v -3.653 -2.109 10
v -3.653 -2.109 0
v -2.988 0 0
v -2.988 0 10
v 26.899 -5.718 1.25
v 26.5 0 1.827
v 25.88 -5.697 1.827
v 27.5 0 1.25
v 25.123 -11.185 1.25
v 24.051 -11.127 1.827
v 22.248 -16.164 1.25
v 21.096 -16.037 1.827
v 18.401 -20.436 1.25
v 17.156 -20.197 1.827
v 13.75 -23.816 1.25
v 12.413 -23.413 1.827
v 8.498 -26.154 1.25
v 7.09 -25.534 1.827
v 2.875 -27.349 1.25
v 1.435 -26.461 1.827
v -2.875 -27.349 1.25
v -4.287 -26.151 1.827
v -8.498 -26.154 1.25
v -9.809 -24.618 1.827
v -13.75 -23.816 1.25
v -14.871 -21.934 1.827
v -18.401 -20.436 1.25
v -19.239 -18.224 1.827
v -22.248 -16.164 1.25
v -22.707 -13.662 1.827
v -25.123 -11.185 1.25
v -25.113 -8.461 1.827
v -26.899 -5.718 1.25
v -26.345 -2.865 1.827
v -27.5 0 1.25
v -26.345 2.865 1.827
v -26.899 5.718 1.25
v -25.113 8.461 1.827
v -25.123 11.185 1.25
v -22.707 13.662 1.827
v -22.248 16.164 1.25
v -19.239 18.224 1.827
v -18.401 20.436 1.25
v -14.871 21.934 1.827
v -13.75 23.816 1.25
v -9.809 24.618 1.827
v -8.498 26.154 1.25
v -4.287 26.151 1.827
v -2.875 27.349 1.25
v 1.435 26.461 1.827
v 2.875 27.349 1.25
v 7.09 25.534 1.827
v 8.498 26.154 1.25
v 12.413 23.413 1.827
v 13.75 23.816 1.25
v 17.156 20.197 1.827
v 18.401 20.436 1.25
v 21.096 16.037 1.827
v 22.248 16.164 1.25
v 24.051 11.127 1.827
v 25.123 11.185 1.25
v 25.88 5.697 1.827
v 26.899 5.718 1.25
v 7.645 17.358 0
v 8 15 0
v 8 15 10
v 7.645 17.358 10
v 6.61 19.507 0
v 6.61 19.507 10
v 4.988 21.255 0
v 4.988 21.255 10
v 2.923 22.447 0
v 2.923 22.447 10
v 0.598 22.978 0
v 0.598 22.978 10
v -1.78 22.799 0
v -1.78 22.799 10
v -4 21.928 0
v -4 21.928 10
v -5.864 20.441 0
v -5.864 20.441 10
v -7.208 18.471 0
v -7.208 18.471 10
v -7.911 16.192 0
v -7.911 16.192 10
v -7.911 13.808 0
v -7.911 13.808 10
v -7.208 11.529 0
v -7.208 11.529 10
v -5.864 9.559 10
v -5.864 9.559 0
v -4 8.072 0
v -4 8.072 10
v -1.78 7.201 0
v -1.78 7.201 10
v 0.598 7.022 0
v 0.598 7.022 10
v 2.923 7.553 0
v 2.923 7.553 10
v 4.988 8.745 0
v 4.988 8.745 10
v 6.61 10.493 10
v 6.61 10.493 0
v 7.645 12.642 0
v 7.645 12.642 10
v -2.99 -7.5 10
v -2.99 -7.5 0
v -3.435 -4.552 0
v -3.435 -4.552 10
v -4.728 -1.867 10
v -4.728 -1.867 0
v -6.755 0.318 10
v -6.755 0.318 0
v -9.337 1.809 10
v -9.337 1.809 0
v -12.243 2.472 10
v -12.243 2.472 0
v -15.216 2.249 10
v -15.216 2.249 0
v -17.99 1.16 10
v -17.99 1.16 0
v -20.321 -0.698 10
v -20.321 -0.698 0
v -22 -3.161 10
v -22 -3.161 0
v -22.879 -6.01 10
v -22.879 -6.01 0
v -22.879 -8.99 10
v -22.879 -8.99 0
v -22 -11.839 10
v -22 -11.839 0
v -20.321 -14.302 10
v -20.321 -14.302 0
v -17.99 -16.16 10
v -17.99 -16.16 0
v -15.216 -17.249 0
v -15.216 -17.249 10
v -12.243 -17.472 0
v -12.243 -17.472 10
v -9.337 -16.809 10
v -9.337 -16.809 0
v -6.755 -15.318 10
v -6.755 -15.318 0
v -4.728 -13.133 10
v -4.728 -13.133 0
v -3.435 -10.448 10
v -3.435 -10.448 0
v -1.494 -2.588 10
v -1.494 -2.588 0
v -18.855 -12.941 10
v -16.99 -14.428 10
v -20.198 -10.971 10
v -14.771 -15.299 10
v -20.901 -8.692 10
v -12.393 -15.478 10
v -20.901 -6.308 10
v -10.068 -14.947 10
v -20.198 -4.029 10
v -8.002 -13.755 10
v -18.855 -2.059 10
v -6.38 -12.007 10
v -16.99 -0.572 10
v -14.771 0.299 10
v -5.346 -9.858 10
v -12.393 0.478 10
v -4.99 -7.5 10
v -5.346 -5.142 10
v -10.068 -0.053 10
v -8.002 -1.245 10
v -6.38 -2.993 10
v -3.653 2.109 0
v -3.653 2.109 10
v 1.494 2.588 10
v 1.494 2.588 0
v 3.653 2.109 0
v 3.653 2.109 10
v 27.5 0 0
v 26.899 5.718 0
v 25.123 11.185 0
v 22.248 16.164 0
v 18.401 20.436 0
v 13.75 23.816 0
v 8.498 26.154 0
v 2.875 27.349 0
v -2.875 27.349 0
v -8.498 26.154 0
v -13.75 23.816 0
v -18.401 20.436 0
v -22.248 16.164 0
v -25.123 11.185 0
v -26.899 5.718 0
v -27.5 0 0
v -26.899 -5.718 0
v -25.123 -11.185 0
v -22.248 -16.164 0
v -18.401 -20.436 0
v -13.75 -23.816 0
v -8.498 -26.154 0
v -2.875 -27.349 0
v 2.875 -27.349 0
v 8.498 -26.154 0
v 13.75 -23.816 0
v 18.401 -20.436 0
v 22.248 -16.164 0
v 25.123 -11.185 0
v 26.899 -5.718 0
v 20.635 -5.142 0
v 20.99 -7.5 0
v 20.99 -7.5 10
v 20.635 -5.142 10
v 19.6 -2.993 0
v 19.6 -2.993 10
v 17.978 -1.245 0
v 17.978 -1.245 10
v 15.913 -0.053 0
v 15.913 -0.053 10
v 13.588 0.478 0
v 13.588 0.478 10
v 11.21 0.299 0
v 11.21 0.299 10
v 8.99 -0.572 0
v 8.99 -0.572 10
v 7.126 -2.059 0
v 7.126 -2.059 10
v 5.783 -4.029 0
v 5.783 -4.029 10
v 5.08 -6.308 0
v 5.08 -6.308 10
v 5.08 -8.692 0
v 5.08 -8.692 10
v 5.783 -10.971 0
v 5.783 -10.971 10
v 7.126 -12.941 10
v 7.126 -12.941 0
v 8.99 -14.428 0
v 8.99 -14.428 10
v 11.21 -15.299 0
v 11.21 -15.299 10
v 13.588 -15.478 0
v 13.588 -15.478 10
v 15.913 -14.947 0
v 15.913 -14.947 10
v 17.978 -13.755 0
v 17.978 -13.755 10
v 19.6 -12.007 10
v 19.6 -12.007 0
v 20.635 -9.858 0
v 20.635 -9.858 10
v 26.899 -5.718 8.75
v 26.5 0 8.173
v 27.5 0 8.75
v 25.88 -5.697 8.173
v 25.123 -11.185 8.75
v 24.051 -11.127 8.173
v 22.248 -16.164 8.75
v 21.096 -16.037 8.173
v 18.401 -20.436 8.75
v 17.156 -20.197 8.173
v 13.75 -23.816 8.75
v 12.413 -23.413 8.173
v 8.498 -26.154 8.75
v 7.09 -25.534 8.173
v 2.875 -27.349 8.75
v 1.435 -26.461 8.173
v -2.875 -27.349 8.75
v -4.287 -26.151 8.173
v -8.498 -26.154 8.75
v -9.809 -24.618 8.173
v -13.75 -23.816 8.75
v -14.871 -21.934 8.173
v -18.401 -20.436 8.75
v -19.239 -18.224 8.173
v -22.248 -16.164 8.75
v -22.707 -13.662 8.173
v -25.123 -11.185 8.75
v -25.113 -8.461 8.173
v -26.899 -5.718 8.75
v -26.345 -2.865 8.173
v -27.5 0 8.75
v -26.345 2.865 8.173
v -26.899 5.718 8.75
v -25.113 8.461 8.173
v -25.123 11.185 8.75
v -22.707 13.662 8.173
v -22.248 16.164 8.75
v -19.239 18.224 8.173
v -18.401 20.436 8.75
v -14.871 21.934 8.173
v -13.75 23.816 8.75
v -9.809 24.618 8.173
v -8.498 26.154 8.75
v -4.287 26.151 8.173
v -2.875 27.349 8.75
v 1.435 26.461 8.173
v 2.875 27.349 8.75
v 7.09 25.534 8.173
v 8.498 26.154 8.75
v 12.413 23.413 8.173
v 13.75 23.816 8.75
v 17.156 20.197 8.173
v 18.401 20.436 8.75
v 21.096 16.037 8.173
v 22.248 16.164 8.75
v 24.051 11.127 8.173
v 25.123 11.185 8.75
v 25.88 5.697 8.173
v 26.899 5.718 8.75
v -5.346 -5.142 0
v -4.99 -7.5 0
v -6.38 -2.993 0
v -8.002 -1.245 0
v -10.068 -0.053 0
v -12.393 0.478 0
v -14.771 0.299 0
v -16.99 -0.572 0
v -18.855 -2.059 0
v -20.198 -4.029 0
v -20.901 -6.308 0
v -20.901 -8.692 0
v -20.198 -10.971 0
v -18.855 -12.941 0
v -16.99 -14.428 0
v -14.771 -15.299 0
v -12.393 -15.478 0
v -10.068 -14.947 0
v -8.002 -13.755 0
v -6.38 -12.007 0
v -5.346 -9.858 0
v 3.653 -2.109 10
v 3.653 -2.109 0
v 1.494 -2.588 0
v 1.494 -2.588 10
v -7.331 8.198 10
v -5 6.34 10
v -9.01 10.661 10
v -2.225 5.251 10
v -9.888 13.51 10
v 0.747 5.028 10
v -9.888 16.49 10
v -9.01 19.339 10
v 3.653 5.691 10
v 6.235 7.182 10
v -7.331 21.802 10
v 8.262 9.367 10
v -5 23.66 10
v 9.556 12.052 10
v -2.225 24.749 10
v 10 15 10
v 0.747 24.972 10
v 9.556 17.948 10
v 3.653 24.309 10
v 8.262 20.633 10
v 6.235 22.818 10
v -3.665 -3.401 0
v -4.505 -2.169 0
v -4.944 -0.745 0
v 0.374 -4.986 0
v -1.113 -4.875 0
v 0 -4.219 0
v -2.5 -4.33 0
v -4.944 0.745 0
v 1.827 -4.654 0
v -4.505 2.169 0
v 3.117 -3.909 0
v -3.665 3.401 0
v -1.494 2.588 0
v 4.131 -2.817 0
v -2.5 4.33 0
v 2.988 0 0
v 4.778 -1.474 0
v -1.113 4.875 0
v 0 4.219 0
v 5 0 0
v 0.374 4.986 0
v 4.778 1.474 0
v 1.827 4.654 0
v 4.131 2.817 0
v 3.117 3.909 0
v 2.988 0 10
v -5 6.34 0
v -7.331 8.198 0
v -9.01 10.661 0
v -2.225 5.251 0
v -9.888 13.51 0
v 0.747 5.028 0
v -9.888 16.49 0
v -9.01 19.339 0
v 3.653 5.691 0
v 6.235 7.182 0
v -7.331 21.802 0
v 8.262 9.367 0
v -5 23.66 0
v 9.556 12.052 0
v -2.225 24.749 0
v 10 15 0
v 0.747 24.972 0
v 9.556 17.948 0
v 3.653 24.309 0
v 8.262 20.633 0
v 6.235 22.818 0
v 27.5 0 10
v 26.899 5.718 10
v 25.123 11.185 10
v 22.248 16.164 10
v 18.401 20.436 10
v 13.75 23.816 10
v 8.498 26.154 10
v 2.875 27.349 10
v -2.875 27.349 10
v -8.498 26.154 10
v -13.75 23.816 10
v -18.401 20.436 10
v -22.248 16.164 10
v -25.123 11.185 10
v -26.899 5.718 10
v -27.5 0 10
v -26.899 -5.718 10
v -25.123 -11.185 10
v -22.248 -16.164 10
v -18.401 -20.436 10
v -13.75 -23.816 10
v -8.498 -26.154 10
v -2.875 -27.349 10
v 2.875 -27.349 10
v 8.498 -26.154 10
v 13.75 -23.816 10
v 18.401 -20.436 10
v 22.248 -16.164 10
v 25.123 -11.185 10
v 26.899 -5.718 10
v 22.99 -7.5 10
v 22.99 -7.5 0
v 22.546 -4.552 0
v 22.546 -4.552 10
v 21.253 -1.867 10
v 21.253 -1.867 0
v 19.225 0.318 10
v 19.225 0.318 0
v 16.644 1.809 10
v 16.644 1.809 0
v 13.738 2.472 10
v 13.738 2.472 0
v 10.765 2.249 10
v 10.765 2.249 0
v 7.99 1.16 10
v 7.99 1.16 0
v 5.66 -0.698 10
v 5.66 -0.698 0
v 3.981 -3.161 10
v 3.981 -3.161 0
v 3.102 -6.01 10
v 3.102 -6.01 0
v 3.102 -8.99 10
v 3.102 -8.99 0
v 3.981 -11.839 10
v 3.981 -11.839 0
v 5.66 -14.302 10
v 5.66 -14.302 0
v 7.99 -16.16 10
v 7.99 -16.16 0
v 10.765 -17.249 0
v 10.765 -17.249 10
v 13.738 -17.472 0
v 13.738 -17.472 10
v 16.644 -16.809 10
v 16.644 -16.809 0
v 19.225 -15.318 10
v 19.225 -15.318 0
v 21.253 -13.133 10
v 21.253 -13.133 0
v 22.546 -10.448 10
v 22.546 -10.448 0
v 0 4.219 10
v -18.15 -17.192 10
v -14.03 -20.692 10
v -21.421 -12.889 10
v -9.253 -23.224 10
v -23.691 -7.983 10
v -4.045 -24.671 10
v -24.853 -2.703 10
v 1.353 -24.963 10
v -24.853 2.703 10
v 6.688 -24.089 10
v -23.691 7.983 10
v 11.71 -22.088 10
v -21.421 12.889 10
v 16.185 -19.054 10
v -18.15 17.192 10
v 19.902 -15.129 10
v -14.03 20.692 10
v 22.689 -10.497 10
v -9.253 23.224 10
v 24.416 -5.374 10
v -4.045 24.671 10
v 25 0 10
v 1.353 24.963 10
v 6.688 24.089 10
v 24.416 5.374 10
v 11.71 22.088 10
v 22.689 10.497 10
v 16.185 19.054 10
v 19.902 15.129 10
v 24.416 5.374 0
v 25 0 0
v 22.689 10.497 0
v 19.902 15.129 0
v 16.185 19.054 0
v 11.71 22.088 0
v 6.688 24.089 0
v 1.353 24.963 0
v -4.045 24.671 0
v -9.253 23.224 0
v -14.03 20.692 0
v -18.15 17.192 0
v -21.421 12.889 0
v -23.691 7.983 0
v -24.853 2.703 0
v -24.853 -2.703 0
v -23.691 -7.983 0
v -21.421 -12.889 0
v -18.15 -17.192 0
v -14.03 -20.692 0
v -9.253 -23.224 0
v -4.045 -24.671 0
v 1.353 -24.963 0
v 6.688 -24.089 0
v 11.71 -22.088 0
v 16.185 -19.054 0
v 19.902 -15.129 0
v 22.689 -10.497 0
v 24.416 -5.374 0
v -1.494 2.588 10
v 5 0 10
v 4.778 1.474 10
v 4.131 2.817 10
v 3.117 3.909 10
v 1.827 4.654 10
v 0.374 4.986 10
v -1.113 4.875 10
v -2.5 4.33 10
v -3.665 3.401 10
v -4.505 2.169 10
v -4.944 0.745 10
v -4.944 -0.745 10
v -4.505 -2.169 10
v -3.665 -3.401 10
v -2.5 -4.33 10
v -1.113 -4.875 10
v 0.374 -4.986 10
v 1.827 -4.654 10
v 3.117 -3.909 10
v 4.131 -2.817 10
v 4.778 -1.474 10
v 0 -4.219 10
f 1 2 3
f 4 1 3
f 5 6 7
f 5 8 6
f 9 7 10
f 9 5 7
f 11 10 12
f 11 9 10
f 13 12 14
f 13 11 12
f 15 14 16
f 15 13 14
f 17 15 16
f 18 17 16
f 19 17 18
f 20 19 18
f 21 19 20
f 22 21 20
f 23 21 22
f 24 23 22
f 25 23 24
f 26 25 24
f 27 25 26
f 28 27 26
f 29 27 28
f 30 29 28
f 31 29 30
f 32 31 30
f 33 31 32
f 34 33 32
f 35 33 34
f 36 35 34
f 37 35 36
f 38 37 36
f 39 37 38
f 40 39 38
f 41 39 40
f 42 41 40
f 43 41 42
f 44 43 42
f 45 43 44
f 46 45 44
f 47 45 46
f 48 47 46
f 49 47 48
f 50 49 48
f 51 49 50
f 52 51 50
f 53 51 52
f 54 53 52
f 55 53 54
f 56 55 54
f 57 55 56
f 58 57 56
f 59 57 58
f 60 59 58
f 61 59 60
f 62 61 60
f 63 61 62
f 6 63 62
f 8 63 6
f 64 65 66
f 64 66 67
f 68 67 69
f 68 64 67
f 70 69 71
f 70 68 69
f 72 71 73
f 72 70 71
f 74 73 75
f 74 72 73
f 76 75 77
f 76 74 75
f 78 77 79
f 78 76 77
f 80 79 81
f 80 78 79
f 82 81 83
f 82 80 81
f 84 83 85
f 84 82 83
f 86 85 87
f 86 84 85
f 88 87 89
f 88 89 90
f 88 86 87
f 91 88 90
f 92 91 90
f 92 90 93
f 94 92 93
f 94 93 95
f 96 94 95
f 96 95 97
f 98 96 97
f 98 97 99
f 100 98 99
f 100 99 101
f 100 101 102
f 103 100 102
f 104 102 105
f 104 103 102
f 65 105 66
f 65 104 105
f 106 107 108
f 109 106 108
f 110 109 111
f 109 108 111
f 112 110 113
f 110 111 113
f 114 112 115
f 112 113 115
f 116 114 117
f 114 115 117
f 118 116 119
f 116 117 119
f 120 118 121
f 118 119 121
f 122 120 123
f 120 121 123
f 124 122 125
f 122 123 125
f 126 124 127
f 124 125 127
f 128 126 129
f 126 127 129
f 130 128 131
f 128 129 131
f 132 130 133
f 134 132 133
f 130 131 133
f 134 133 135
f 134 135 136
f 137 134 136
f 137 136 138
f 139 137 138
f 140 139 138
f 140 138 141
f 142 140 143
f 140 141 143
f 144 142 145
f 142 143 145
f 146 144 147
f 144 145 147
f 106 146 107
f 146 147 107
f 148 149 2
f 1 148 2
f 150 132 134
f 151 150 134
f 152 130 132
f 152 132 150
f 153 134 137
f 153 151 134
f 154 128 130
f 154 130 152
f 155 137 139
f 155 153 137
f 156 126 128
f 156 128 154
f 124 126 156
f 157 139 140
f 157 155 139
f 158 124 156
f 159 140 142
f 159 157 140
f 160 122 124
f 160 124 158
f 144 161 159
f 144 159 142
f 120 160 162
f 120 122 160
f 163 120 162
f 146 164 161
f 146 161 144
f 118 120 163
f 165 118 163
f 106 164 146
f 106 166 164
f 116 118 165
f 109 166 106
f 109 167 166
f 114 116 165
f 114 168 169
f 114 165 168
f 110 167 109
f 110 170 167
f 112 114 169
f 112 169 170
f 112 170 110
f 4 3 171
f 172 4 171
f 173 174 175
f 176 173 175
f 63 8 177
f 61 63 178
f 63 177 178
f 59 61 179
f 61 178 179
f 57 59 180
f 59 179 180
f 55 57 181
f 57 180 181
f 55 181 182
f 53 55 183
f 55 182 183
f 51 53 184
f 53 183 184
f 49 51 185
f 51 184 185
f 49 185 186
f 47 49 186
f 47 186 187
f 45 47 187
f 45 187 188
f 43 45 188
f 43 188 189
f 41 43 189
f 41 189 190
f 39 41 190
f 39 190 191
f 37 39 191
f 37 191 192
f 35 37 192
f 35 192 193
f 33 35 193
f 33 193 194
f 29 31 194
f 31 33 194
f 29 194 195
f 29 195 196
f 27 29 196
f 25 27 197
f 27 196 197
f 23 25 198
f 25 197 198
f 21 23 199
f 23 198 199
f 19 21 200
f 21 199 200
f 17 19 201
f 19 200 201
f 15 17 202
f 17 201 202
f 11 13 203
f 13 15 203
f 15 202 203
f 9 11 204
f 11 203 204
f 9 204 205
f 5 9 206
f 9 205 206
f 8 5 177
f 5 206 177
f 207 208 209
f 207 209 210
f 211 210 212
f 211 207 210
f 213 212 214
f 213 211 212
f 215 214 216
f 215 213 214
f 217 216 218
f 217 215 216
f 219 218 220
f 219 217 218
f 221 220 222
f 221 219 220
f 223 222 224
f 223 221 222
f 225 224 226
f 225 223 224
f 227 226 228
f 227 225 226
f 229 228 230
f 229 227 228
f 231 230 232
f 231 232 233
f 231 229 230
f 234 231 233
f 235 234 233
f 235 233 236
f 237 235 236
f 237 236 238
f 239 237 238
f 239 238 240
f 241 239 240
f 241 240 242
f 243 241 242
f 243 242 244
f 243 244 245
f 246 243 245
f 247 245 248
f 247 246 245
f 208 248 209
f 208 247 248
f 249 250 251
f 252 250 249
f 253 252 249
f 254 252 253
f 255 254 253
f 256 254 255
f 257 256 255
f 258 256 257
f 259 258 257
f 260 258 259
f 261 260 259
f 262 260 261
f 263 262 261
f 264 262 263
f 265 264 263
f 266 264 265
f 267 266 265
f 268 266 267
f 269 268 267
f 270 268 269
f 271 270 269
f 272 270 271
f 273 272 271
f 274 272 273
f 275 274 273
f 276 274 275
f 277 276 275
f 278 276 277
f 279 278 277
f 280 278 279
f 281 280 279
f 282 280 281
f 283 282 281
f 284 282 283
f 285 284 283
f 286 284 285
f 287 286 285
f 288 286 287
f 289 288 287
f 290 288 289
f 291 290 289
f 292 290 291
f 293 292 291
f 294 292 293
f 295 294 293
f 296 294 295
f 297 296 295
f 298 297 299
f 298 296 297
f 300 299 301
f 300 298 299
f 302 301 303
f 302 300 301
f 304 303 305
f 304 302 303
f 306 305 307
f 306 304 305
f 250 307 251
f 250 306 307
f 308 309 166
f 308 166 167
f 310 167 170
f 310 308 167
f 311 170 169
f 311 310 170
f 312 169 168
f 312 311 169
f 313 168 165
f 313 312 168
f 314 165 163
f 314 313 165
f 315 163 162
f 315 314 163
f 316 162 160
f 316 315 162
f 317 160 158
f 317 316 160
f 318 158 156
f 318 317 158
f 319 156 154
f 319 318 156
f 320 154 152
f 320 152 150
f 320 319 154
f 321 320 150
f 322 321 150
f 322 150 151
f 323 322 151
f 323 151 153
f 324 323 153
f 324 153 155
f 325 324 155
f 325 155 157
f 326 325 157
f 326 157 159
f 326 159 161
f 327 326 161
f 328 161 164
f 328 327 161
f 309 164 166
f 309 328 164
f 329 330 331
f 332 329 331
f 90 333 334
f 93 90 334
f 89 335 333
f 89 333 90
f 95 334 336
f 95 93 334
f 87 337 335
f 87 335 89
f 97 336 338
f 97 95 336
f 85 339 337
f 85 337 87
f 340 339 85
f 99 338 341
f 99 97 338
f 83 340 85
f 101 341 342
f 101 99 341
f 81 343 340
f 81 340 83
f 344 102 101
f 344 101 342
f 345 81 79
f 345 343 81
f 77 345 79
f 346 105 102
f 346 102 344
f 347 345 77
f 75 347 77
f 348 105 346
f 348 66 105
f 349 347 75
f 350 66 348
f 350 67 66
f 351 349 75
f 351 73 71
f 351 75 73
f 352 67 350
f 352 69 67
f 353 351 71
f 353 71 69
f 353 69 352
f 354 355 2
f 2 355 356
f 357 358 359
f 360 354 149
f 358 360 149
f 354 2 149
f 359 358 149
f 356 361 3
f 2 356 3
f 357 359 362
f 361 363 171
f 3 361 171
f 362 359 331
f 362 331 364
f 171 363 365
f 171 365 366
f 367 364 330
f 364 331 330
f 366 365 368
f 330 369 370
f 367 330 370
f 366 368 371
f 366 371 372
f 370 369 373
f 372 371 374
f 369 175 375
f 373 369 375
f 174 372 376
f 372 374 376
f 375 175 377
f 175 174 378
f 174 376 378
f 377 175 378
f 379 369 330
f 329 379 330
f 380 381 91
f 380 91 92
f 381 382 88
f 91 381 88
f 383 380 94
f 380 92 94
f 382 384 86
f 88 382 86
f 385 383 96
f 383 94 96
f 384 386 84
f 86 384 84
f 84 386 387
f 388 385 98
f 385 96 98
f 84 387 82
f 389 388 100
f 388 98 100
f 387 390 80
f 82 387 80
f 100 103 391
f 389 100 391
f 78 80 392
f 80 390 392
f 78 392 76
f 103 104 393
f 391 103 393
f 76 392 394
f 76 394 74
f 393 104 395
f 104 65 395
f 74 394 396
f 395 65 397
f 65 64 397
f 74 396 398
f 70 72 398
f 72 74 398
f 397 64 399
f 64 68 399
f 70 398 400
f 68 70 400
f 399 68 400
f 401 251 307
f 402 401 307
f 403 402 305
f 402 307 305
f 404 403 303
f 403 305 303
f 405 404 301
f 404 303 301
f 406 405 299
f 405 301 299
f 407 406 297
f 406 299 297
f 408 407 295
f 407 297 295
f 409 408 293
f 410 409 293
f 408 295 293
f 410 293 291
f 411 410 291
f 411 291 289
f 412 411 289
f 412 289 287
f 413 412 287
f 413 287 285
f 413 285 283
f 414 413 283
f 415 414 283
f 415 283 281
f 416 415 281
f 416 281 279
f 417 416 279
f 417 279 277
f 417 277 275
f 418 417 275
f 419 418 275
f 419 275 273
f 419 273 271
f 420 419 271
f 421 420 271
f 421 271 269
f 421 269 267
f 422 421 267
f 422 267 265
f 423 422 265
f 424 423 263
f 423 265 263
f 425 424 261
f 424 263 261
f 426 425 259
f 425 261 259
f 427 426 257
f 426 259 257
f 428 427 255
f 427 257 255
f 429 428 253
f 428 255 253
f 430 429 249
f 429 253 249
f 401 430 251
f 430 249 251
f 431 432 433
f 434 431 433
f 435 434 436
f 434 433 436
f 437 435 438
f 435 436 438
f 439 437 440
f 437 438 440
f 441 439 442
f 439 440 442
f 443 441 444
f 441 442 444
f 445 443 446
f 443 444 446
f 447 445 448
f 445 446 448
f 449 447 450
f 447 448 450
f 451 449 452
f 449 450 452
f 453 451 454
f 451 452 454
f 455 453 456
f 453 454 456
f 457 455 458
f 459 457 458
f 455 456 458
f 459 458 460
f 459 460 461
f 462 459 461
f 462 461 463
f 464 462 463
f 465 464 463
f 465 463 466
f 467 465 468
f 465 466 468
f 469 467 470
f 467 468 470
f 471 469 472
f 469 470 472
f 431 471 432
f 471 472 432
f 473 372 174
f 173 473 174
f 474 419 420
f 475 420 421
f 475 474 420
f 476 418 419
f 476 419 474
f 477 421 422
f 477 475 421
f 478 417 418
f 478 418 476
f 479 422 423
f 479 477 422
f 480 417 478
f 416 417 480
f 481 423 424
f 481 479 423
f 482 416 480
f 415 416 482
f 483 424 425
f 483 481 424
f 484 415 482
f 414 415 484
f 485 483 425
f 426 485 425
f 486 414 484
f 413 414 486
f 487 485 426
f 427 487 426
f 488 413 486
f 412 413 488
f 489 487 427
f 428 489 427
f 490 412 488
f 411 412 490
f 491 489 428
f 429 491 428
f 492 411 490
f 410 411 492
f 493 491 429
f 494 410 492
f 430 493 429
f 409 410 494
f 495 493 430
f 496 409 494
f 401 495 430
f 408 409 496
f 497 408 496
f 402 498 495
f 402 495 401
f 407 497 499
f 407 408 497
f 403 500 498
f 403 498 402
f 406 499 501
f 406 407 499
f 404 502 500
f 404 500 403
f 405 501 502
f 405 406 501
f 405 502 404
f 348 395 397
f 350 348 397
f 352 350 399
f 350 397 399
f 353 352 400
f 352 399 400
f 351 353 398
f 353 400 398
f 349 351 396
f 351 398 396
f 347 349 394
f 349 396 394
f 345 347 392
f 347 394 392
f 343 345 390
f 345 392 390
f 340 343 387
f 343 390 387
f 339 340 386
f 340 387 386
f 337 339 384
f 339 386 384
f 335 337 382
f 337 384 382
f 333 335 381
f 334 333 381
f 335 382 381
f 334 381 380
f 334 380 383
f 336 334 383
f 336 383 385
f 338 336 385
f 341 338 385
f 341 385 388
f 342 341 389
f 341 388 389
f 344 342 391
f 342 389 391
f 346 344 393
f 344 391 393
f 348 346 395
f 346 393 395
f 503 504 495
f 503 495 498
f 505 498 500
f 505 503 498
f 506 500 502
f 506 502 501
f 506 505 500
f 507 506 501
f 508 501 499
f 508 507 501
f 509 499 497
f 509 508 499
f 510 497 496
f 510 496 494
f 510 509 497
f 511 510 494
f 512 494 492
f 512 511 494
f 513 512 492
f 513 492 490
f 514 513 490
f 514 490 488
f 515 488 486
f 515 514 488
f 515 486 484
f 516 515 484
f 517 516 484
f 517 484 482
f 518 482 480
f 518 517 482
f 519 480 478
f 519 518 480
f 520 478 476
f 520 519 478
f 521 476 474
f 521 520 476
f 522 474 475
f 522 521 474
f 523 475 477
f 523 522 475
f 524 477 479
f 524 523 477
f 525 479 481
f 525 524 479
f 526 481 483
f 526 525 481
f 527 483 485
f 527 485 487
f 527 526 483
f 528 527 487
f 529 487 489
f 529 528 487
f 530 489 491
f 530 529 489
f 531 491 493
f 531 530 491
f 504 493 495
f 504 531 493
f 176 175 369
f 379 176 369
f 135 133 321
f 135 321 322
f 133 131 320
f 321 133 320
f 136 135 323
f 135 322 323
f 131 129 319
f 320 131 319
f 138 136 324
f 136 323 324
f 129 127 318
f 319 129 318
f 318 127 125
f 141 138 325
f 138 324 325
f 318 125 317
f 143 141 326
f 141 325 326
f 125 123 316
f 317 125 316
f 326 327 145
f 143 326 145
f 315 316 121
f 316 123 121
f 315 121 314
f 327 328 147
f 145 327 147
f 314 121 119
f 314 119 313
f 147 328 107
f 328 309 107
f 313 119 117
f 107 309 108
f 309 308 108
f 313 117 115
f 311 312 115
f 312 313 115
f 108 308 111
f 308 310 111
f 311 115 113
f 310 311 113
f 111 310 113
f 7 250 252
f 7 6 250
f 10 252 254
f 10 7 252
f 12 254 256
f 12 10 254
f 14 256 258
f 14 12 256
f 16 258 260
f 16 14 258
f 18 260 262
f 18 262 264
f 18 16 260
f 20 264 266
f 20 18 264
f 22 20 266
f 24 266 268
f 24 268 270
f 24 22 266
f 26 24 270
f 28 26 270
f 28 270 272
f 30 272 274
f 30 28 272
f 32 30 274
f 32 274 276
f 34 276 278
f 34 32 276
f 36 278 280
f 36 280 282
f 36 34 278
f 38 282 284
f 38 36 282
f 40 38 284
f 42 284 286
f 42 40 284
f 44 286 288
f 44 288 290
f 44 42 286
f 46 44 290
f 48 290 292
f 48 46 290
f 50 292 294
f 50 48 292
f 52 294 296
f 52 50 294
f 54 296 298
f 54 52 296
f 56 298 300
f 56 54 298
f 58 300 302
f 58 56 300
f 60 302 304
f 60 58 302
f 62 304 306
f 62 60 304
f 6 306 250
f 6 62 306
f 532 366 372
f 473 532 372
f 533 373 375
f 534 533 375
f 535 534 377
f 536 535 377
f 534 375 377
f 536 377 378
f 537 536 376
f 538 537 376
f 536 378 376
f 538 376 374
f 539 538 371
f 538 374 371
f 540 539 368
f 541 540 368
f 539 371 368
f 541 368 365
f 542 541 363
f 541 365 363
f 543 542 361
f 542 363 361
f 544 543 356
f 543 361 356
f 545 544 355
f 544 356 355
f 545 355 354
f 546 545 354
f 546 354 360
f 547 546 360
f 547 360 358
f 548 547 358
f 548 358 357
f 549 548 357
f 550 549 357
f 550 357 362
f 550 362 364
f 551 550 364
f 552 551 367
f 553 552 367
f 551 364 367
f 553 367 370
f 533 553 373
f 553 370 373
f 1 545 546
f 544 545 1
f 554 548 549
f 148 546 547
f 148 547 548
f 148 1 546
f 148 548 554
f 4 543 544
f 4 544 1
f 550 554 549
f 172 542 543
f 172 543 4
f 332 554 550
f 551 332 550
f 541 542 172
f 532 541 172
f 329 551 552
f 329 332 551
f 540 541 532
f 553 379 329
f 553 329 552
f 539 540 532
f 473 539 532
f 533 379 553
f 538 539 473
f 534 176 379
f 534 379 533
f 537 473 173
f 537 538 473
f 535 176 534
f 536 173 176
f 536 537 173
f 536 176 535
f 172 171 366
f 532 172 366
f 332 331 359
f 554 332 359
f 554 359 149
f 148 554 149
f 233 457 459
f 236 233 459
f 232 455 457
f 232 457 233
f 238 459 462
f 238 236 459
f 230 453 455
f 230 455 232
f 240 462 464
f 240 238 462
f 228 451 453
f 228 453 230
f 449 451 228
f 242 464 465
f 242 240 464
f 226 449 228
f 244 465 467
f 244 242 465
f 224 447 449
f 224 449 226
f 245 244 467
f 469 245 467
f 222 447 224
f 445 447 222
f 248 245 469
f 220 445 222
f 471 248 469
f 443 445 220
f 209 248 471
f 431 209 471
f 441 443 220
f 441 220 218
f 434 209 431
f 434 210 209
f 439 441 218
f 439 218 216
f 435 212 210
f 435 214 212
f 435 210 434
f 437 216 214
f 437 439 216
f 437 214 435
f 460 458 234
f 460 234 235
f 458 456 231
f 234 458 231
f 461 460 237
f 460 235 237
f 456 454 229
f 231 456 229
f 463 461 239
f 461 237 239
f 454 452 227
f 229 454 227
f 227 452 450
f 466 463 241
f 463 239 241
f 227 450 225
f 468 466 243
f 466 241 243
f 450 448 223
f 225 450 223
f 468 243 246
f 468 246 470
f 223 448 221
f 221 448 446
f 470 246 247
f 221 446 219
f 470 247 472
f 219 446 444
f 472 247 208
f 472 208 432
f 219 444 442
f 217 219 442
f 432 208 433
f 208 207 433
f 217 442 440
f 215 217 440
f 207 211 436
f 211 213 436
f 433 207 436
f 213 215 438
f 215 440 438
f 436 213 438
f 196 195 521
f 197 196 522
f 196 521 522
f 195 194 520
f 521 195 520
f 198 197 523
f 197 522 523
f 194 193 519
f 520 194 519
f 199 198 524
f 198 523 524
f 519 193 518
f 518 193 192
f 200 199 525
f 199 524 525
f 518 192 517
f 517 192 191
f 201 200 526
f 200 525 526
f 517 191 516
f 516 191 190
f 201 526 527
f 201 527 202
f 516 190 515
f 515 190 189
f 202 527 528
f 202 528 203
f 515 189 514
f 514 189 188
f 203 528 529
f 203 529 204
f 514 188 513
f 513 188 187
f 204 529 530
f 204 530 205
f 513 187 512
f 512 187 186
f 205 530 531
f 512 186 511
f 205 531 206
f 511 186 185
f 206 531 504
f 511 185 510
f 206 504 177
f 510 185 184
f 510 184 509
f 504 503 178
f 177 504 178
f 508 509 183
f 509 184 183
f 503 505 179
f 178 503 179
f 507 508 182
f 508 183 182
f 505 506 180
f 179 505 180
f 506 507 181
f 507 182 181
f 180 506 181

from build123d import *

# Parameters (mm, degrees)
SKETCH1_R             = 10
SKETCH1_R_2           = 8
BOSS_EXTRUDE1_DEPTH   = 10
BOSS_EXTRUDE1_2_DEPTH = 10
BOSS_EXTRUDE1_3_DEPTH = 10
SKETCH1_R_3           = 27.5
SKETCH1_R_4           = 25
BOSS_EXTRUDE1_4_DEPTH = 10
SKETCH1_R_5           = 5
BOSS_EXTRUDE1_5_DEPTH = 10
CUT_EXTRUDE1_DEPTH    = 10
CUT_EXTRUDE2_DEPTH    = 10


with BuildPart() as part:
    # Sketch1 → Boss-Extrude1 (new body)
    with BuildSketch(Plane.XY):
        with Locations((0, 15)):
            Circle(SKETCH1_R)
        with Locations((0, 15)):
            Circle(SKETCH1_R_2, mode=Mode.SUBTRACT)
    extrude(amount=BOSS_EXTRUDE1_DEPTH)


with BuildPart() as body_2:
    # Sketch1 → Boss-Extrude1 2 (new body)
    with BuildSketch(Plane.XY):
        with Locations((-12.990381057, -7.5)):
            Circle(SKETCH1_R)
        with Locations((-12.990381057, -7.5)):
            Circle(SKETCH1_R_2, mode=Mode.SUBTRACT)
    extrude(amount=BOSS_EXTRUDE1_2_DEPTH)


with BuildPart() as body_3:
    # Sketch1 → Boss-Extrude1 3 (new body)
    with BuildSketch(Plane.XY):
        with Locations((12.990381057, -7.5)):
            Circle(SKETCH1_R)
        with Locations((12.990381057, -7.5)):
            Circle(SKETCH1_R_2, mode=Mode.SUBTRACT)
    extrude(amount=BOSS_EXTRUDE1_3_DEPTH)


with BuildPart() as body_4:
    # Sketch1 → Boss-Extrude1 4 (new body)
    with BuildSketch(Plane.XY):
        Circle(SKETCH1_R_3)
        Circle(SKETCH1_R_4, mode=Mode.SUBTRACT)
    extrude(amount=BOSS_EXTRUDE1_4_DEPTH)

    # Sketch3 → Cut-Revolve1 (revolve, cut)
    with BuildSketch(Plane(origin=(0, 0, 0), x_dir=(0, 0, -1), z_dir=(1, 0, 0)), mode=Mode.PRIVATE) as cut_revolve1_sk:
        Polygon((-8.75, 27.5), (-8.172649731, 26.5), (-1.827350269, 26.5), (-1.25, 27.5), align=None)
    revolve(cut_revolve1_sk.sketch.rotate(Axis((0, 0, 5), (0, 0, -1)), 90), axis=Axis((0, 0, 5), (0, 0, -1)), mode=Mode.SUBTRACT)


with BuildPart() as body_5:
    # Sketch1 → Boss-Extrude1 5 (new body)
    with BuildSketch(Plane.XY):
        Circle(SKETCH1_R_5)
    extrude(amount=BOSS_EXTRUDE1_5_DEPTH)

    # Sketch2 → Cut-Extrude1 (cut)
    with BuildSketch(Plane(origin=(0, 0, 0), x_dir=(-1, 0, 0), z_dir=(0, 0, -1))):
        Polygon((0, -3.922496167), (1.389301091, -2.406340076), (3.396981327, -1.961248084), (2.778602182, 0), (3.396981327, 1.961248084), (1.389301091, 2.406340076), (0, 3.922496167), (-1.389301091, 2.406340076), (-3.396981327, 1.961248084), (-2.778602182, 0), (-3.396981327, -1.961248084), (-1.389301091, -2.406340076), align=None)
    extrude(amount=-CUT_EXTRUDE1_DEPTH, mode=Mode.SUBTRACT)

    # Sketch5 → Cut-Extrude2 (cut)
    with BuildSketch(Plane(origin=(0, 0, 0), x_dir=(-1, 0, 0), z_dir=(0, 0, -1))):
        Polygon((-3.653357276, 2.109266807), (-2.988308007, 0), (-3.653357276, -2.109266807), (-1.494154003, -2.587950648), (0, -4.218533614), (1.494154003, -2.587950648), (3.653357276, -2.109266807), (2.988308007, 0), (3.653357276, 2.109266807), (1.494154003, 2.587950648), (0, 4.218533614), (-1.494154003, 2.587950648), align=None)
    extrude(amount=-CUT_EXTRUDE2_DEPTH, mode=Mode.SUBTRACT)


solid = Compound([part.part, body_2.part, body_3.part, body_4.part, body_5.part])
